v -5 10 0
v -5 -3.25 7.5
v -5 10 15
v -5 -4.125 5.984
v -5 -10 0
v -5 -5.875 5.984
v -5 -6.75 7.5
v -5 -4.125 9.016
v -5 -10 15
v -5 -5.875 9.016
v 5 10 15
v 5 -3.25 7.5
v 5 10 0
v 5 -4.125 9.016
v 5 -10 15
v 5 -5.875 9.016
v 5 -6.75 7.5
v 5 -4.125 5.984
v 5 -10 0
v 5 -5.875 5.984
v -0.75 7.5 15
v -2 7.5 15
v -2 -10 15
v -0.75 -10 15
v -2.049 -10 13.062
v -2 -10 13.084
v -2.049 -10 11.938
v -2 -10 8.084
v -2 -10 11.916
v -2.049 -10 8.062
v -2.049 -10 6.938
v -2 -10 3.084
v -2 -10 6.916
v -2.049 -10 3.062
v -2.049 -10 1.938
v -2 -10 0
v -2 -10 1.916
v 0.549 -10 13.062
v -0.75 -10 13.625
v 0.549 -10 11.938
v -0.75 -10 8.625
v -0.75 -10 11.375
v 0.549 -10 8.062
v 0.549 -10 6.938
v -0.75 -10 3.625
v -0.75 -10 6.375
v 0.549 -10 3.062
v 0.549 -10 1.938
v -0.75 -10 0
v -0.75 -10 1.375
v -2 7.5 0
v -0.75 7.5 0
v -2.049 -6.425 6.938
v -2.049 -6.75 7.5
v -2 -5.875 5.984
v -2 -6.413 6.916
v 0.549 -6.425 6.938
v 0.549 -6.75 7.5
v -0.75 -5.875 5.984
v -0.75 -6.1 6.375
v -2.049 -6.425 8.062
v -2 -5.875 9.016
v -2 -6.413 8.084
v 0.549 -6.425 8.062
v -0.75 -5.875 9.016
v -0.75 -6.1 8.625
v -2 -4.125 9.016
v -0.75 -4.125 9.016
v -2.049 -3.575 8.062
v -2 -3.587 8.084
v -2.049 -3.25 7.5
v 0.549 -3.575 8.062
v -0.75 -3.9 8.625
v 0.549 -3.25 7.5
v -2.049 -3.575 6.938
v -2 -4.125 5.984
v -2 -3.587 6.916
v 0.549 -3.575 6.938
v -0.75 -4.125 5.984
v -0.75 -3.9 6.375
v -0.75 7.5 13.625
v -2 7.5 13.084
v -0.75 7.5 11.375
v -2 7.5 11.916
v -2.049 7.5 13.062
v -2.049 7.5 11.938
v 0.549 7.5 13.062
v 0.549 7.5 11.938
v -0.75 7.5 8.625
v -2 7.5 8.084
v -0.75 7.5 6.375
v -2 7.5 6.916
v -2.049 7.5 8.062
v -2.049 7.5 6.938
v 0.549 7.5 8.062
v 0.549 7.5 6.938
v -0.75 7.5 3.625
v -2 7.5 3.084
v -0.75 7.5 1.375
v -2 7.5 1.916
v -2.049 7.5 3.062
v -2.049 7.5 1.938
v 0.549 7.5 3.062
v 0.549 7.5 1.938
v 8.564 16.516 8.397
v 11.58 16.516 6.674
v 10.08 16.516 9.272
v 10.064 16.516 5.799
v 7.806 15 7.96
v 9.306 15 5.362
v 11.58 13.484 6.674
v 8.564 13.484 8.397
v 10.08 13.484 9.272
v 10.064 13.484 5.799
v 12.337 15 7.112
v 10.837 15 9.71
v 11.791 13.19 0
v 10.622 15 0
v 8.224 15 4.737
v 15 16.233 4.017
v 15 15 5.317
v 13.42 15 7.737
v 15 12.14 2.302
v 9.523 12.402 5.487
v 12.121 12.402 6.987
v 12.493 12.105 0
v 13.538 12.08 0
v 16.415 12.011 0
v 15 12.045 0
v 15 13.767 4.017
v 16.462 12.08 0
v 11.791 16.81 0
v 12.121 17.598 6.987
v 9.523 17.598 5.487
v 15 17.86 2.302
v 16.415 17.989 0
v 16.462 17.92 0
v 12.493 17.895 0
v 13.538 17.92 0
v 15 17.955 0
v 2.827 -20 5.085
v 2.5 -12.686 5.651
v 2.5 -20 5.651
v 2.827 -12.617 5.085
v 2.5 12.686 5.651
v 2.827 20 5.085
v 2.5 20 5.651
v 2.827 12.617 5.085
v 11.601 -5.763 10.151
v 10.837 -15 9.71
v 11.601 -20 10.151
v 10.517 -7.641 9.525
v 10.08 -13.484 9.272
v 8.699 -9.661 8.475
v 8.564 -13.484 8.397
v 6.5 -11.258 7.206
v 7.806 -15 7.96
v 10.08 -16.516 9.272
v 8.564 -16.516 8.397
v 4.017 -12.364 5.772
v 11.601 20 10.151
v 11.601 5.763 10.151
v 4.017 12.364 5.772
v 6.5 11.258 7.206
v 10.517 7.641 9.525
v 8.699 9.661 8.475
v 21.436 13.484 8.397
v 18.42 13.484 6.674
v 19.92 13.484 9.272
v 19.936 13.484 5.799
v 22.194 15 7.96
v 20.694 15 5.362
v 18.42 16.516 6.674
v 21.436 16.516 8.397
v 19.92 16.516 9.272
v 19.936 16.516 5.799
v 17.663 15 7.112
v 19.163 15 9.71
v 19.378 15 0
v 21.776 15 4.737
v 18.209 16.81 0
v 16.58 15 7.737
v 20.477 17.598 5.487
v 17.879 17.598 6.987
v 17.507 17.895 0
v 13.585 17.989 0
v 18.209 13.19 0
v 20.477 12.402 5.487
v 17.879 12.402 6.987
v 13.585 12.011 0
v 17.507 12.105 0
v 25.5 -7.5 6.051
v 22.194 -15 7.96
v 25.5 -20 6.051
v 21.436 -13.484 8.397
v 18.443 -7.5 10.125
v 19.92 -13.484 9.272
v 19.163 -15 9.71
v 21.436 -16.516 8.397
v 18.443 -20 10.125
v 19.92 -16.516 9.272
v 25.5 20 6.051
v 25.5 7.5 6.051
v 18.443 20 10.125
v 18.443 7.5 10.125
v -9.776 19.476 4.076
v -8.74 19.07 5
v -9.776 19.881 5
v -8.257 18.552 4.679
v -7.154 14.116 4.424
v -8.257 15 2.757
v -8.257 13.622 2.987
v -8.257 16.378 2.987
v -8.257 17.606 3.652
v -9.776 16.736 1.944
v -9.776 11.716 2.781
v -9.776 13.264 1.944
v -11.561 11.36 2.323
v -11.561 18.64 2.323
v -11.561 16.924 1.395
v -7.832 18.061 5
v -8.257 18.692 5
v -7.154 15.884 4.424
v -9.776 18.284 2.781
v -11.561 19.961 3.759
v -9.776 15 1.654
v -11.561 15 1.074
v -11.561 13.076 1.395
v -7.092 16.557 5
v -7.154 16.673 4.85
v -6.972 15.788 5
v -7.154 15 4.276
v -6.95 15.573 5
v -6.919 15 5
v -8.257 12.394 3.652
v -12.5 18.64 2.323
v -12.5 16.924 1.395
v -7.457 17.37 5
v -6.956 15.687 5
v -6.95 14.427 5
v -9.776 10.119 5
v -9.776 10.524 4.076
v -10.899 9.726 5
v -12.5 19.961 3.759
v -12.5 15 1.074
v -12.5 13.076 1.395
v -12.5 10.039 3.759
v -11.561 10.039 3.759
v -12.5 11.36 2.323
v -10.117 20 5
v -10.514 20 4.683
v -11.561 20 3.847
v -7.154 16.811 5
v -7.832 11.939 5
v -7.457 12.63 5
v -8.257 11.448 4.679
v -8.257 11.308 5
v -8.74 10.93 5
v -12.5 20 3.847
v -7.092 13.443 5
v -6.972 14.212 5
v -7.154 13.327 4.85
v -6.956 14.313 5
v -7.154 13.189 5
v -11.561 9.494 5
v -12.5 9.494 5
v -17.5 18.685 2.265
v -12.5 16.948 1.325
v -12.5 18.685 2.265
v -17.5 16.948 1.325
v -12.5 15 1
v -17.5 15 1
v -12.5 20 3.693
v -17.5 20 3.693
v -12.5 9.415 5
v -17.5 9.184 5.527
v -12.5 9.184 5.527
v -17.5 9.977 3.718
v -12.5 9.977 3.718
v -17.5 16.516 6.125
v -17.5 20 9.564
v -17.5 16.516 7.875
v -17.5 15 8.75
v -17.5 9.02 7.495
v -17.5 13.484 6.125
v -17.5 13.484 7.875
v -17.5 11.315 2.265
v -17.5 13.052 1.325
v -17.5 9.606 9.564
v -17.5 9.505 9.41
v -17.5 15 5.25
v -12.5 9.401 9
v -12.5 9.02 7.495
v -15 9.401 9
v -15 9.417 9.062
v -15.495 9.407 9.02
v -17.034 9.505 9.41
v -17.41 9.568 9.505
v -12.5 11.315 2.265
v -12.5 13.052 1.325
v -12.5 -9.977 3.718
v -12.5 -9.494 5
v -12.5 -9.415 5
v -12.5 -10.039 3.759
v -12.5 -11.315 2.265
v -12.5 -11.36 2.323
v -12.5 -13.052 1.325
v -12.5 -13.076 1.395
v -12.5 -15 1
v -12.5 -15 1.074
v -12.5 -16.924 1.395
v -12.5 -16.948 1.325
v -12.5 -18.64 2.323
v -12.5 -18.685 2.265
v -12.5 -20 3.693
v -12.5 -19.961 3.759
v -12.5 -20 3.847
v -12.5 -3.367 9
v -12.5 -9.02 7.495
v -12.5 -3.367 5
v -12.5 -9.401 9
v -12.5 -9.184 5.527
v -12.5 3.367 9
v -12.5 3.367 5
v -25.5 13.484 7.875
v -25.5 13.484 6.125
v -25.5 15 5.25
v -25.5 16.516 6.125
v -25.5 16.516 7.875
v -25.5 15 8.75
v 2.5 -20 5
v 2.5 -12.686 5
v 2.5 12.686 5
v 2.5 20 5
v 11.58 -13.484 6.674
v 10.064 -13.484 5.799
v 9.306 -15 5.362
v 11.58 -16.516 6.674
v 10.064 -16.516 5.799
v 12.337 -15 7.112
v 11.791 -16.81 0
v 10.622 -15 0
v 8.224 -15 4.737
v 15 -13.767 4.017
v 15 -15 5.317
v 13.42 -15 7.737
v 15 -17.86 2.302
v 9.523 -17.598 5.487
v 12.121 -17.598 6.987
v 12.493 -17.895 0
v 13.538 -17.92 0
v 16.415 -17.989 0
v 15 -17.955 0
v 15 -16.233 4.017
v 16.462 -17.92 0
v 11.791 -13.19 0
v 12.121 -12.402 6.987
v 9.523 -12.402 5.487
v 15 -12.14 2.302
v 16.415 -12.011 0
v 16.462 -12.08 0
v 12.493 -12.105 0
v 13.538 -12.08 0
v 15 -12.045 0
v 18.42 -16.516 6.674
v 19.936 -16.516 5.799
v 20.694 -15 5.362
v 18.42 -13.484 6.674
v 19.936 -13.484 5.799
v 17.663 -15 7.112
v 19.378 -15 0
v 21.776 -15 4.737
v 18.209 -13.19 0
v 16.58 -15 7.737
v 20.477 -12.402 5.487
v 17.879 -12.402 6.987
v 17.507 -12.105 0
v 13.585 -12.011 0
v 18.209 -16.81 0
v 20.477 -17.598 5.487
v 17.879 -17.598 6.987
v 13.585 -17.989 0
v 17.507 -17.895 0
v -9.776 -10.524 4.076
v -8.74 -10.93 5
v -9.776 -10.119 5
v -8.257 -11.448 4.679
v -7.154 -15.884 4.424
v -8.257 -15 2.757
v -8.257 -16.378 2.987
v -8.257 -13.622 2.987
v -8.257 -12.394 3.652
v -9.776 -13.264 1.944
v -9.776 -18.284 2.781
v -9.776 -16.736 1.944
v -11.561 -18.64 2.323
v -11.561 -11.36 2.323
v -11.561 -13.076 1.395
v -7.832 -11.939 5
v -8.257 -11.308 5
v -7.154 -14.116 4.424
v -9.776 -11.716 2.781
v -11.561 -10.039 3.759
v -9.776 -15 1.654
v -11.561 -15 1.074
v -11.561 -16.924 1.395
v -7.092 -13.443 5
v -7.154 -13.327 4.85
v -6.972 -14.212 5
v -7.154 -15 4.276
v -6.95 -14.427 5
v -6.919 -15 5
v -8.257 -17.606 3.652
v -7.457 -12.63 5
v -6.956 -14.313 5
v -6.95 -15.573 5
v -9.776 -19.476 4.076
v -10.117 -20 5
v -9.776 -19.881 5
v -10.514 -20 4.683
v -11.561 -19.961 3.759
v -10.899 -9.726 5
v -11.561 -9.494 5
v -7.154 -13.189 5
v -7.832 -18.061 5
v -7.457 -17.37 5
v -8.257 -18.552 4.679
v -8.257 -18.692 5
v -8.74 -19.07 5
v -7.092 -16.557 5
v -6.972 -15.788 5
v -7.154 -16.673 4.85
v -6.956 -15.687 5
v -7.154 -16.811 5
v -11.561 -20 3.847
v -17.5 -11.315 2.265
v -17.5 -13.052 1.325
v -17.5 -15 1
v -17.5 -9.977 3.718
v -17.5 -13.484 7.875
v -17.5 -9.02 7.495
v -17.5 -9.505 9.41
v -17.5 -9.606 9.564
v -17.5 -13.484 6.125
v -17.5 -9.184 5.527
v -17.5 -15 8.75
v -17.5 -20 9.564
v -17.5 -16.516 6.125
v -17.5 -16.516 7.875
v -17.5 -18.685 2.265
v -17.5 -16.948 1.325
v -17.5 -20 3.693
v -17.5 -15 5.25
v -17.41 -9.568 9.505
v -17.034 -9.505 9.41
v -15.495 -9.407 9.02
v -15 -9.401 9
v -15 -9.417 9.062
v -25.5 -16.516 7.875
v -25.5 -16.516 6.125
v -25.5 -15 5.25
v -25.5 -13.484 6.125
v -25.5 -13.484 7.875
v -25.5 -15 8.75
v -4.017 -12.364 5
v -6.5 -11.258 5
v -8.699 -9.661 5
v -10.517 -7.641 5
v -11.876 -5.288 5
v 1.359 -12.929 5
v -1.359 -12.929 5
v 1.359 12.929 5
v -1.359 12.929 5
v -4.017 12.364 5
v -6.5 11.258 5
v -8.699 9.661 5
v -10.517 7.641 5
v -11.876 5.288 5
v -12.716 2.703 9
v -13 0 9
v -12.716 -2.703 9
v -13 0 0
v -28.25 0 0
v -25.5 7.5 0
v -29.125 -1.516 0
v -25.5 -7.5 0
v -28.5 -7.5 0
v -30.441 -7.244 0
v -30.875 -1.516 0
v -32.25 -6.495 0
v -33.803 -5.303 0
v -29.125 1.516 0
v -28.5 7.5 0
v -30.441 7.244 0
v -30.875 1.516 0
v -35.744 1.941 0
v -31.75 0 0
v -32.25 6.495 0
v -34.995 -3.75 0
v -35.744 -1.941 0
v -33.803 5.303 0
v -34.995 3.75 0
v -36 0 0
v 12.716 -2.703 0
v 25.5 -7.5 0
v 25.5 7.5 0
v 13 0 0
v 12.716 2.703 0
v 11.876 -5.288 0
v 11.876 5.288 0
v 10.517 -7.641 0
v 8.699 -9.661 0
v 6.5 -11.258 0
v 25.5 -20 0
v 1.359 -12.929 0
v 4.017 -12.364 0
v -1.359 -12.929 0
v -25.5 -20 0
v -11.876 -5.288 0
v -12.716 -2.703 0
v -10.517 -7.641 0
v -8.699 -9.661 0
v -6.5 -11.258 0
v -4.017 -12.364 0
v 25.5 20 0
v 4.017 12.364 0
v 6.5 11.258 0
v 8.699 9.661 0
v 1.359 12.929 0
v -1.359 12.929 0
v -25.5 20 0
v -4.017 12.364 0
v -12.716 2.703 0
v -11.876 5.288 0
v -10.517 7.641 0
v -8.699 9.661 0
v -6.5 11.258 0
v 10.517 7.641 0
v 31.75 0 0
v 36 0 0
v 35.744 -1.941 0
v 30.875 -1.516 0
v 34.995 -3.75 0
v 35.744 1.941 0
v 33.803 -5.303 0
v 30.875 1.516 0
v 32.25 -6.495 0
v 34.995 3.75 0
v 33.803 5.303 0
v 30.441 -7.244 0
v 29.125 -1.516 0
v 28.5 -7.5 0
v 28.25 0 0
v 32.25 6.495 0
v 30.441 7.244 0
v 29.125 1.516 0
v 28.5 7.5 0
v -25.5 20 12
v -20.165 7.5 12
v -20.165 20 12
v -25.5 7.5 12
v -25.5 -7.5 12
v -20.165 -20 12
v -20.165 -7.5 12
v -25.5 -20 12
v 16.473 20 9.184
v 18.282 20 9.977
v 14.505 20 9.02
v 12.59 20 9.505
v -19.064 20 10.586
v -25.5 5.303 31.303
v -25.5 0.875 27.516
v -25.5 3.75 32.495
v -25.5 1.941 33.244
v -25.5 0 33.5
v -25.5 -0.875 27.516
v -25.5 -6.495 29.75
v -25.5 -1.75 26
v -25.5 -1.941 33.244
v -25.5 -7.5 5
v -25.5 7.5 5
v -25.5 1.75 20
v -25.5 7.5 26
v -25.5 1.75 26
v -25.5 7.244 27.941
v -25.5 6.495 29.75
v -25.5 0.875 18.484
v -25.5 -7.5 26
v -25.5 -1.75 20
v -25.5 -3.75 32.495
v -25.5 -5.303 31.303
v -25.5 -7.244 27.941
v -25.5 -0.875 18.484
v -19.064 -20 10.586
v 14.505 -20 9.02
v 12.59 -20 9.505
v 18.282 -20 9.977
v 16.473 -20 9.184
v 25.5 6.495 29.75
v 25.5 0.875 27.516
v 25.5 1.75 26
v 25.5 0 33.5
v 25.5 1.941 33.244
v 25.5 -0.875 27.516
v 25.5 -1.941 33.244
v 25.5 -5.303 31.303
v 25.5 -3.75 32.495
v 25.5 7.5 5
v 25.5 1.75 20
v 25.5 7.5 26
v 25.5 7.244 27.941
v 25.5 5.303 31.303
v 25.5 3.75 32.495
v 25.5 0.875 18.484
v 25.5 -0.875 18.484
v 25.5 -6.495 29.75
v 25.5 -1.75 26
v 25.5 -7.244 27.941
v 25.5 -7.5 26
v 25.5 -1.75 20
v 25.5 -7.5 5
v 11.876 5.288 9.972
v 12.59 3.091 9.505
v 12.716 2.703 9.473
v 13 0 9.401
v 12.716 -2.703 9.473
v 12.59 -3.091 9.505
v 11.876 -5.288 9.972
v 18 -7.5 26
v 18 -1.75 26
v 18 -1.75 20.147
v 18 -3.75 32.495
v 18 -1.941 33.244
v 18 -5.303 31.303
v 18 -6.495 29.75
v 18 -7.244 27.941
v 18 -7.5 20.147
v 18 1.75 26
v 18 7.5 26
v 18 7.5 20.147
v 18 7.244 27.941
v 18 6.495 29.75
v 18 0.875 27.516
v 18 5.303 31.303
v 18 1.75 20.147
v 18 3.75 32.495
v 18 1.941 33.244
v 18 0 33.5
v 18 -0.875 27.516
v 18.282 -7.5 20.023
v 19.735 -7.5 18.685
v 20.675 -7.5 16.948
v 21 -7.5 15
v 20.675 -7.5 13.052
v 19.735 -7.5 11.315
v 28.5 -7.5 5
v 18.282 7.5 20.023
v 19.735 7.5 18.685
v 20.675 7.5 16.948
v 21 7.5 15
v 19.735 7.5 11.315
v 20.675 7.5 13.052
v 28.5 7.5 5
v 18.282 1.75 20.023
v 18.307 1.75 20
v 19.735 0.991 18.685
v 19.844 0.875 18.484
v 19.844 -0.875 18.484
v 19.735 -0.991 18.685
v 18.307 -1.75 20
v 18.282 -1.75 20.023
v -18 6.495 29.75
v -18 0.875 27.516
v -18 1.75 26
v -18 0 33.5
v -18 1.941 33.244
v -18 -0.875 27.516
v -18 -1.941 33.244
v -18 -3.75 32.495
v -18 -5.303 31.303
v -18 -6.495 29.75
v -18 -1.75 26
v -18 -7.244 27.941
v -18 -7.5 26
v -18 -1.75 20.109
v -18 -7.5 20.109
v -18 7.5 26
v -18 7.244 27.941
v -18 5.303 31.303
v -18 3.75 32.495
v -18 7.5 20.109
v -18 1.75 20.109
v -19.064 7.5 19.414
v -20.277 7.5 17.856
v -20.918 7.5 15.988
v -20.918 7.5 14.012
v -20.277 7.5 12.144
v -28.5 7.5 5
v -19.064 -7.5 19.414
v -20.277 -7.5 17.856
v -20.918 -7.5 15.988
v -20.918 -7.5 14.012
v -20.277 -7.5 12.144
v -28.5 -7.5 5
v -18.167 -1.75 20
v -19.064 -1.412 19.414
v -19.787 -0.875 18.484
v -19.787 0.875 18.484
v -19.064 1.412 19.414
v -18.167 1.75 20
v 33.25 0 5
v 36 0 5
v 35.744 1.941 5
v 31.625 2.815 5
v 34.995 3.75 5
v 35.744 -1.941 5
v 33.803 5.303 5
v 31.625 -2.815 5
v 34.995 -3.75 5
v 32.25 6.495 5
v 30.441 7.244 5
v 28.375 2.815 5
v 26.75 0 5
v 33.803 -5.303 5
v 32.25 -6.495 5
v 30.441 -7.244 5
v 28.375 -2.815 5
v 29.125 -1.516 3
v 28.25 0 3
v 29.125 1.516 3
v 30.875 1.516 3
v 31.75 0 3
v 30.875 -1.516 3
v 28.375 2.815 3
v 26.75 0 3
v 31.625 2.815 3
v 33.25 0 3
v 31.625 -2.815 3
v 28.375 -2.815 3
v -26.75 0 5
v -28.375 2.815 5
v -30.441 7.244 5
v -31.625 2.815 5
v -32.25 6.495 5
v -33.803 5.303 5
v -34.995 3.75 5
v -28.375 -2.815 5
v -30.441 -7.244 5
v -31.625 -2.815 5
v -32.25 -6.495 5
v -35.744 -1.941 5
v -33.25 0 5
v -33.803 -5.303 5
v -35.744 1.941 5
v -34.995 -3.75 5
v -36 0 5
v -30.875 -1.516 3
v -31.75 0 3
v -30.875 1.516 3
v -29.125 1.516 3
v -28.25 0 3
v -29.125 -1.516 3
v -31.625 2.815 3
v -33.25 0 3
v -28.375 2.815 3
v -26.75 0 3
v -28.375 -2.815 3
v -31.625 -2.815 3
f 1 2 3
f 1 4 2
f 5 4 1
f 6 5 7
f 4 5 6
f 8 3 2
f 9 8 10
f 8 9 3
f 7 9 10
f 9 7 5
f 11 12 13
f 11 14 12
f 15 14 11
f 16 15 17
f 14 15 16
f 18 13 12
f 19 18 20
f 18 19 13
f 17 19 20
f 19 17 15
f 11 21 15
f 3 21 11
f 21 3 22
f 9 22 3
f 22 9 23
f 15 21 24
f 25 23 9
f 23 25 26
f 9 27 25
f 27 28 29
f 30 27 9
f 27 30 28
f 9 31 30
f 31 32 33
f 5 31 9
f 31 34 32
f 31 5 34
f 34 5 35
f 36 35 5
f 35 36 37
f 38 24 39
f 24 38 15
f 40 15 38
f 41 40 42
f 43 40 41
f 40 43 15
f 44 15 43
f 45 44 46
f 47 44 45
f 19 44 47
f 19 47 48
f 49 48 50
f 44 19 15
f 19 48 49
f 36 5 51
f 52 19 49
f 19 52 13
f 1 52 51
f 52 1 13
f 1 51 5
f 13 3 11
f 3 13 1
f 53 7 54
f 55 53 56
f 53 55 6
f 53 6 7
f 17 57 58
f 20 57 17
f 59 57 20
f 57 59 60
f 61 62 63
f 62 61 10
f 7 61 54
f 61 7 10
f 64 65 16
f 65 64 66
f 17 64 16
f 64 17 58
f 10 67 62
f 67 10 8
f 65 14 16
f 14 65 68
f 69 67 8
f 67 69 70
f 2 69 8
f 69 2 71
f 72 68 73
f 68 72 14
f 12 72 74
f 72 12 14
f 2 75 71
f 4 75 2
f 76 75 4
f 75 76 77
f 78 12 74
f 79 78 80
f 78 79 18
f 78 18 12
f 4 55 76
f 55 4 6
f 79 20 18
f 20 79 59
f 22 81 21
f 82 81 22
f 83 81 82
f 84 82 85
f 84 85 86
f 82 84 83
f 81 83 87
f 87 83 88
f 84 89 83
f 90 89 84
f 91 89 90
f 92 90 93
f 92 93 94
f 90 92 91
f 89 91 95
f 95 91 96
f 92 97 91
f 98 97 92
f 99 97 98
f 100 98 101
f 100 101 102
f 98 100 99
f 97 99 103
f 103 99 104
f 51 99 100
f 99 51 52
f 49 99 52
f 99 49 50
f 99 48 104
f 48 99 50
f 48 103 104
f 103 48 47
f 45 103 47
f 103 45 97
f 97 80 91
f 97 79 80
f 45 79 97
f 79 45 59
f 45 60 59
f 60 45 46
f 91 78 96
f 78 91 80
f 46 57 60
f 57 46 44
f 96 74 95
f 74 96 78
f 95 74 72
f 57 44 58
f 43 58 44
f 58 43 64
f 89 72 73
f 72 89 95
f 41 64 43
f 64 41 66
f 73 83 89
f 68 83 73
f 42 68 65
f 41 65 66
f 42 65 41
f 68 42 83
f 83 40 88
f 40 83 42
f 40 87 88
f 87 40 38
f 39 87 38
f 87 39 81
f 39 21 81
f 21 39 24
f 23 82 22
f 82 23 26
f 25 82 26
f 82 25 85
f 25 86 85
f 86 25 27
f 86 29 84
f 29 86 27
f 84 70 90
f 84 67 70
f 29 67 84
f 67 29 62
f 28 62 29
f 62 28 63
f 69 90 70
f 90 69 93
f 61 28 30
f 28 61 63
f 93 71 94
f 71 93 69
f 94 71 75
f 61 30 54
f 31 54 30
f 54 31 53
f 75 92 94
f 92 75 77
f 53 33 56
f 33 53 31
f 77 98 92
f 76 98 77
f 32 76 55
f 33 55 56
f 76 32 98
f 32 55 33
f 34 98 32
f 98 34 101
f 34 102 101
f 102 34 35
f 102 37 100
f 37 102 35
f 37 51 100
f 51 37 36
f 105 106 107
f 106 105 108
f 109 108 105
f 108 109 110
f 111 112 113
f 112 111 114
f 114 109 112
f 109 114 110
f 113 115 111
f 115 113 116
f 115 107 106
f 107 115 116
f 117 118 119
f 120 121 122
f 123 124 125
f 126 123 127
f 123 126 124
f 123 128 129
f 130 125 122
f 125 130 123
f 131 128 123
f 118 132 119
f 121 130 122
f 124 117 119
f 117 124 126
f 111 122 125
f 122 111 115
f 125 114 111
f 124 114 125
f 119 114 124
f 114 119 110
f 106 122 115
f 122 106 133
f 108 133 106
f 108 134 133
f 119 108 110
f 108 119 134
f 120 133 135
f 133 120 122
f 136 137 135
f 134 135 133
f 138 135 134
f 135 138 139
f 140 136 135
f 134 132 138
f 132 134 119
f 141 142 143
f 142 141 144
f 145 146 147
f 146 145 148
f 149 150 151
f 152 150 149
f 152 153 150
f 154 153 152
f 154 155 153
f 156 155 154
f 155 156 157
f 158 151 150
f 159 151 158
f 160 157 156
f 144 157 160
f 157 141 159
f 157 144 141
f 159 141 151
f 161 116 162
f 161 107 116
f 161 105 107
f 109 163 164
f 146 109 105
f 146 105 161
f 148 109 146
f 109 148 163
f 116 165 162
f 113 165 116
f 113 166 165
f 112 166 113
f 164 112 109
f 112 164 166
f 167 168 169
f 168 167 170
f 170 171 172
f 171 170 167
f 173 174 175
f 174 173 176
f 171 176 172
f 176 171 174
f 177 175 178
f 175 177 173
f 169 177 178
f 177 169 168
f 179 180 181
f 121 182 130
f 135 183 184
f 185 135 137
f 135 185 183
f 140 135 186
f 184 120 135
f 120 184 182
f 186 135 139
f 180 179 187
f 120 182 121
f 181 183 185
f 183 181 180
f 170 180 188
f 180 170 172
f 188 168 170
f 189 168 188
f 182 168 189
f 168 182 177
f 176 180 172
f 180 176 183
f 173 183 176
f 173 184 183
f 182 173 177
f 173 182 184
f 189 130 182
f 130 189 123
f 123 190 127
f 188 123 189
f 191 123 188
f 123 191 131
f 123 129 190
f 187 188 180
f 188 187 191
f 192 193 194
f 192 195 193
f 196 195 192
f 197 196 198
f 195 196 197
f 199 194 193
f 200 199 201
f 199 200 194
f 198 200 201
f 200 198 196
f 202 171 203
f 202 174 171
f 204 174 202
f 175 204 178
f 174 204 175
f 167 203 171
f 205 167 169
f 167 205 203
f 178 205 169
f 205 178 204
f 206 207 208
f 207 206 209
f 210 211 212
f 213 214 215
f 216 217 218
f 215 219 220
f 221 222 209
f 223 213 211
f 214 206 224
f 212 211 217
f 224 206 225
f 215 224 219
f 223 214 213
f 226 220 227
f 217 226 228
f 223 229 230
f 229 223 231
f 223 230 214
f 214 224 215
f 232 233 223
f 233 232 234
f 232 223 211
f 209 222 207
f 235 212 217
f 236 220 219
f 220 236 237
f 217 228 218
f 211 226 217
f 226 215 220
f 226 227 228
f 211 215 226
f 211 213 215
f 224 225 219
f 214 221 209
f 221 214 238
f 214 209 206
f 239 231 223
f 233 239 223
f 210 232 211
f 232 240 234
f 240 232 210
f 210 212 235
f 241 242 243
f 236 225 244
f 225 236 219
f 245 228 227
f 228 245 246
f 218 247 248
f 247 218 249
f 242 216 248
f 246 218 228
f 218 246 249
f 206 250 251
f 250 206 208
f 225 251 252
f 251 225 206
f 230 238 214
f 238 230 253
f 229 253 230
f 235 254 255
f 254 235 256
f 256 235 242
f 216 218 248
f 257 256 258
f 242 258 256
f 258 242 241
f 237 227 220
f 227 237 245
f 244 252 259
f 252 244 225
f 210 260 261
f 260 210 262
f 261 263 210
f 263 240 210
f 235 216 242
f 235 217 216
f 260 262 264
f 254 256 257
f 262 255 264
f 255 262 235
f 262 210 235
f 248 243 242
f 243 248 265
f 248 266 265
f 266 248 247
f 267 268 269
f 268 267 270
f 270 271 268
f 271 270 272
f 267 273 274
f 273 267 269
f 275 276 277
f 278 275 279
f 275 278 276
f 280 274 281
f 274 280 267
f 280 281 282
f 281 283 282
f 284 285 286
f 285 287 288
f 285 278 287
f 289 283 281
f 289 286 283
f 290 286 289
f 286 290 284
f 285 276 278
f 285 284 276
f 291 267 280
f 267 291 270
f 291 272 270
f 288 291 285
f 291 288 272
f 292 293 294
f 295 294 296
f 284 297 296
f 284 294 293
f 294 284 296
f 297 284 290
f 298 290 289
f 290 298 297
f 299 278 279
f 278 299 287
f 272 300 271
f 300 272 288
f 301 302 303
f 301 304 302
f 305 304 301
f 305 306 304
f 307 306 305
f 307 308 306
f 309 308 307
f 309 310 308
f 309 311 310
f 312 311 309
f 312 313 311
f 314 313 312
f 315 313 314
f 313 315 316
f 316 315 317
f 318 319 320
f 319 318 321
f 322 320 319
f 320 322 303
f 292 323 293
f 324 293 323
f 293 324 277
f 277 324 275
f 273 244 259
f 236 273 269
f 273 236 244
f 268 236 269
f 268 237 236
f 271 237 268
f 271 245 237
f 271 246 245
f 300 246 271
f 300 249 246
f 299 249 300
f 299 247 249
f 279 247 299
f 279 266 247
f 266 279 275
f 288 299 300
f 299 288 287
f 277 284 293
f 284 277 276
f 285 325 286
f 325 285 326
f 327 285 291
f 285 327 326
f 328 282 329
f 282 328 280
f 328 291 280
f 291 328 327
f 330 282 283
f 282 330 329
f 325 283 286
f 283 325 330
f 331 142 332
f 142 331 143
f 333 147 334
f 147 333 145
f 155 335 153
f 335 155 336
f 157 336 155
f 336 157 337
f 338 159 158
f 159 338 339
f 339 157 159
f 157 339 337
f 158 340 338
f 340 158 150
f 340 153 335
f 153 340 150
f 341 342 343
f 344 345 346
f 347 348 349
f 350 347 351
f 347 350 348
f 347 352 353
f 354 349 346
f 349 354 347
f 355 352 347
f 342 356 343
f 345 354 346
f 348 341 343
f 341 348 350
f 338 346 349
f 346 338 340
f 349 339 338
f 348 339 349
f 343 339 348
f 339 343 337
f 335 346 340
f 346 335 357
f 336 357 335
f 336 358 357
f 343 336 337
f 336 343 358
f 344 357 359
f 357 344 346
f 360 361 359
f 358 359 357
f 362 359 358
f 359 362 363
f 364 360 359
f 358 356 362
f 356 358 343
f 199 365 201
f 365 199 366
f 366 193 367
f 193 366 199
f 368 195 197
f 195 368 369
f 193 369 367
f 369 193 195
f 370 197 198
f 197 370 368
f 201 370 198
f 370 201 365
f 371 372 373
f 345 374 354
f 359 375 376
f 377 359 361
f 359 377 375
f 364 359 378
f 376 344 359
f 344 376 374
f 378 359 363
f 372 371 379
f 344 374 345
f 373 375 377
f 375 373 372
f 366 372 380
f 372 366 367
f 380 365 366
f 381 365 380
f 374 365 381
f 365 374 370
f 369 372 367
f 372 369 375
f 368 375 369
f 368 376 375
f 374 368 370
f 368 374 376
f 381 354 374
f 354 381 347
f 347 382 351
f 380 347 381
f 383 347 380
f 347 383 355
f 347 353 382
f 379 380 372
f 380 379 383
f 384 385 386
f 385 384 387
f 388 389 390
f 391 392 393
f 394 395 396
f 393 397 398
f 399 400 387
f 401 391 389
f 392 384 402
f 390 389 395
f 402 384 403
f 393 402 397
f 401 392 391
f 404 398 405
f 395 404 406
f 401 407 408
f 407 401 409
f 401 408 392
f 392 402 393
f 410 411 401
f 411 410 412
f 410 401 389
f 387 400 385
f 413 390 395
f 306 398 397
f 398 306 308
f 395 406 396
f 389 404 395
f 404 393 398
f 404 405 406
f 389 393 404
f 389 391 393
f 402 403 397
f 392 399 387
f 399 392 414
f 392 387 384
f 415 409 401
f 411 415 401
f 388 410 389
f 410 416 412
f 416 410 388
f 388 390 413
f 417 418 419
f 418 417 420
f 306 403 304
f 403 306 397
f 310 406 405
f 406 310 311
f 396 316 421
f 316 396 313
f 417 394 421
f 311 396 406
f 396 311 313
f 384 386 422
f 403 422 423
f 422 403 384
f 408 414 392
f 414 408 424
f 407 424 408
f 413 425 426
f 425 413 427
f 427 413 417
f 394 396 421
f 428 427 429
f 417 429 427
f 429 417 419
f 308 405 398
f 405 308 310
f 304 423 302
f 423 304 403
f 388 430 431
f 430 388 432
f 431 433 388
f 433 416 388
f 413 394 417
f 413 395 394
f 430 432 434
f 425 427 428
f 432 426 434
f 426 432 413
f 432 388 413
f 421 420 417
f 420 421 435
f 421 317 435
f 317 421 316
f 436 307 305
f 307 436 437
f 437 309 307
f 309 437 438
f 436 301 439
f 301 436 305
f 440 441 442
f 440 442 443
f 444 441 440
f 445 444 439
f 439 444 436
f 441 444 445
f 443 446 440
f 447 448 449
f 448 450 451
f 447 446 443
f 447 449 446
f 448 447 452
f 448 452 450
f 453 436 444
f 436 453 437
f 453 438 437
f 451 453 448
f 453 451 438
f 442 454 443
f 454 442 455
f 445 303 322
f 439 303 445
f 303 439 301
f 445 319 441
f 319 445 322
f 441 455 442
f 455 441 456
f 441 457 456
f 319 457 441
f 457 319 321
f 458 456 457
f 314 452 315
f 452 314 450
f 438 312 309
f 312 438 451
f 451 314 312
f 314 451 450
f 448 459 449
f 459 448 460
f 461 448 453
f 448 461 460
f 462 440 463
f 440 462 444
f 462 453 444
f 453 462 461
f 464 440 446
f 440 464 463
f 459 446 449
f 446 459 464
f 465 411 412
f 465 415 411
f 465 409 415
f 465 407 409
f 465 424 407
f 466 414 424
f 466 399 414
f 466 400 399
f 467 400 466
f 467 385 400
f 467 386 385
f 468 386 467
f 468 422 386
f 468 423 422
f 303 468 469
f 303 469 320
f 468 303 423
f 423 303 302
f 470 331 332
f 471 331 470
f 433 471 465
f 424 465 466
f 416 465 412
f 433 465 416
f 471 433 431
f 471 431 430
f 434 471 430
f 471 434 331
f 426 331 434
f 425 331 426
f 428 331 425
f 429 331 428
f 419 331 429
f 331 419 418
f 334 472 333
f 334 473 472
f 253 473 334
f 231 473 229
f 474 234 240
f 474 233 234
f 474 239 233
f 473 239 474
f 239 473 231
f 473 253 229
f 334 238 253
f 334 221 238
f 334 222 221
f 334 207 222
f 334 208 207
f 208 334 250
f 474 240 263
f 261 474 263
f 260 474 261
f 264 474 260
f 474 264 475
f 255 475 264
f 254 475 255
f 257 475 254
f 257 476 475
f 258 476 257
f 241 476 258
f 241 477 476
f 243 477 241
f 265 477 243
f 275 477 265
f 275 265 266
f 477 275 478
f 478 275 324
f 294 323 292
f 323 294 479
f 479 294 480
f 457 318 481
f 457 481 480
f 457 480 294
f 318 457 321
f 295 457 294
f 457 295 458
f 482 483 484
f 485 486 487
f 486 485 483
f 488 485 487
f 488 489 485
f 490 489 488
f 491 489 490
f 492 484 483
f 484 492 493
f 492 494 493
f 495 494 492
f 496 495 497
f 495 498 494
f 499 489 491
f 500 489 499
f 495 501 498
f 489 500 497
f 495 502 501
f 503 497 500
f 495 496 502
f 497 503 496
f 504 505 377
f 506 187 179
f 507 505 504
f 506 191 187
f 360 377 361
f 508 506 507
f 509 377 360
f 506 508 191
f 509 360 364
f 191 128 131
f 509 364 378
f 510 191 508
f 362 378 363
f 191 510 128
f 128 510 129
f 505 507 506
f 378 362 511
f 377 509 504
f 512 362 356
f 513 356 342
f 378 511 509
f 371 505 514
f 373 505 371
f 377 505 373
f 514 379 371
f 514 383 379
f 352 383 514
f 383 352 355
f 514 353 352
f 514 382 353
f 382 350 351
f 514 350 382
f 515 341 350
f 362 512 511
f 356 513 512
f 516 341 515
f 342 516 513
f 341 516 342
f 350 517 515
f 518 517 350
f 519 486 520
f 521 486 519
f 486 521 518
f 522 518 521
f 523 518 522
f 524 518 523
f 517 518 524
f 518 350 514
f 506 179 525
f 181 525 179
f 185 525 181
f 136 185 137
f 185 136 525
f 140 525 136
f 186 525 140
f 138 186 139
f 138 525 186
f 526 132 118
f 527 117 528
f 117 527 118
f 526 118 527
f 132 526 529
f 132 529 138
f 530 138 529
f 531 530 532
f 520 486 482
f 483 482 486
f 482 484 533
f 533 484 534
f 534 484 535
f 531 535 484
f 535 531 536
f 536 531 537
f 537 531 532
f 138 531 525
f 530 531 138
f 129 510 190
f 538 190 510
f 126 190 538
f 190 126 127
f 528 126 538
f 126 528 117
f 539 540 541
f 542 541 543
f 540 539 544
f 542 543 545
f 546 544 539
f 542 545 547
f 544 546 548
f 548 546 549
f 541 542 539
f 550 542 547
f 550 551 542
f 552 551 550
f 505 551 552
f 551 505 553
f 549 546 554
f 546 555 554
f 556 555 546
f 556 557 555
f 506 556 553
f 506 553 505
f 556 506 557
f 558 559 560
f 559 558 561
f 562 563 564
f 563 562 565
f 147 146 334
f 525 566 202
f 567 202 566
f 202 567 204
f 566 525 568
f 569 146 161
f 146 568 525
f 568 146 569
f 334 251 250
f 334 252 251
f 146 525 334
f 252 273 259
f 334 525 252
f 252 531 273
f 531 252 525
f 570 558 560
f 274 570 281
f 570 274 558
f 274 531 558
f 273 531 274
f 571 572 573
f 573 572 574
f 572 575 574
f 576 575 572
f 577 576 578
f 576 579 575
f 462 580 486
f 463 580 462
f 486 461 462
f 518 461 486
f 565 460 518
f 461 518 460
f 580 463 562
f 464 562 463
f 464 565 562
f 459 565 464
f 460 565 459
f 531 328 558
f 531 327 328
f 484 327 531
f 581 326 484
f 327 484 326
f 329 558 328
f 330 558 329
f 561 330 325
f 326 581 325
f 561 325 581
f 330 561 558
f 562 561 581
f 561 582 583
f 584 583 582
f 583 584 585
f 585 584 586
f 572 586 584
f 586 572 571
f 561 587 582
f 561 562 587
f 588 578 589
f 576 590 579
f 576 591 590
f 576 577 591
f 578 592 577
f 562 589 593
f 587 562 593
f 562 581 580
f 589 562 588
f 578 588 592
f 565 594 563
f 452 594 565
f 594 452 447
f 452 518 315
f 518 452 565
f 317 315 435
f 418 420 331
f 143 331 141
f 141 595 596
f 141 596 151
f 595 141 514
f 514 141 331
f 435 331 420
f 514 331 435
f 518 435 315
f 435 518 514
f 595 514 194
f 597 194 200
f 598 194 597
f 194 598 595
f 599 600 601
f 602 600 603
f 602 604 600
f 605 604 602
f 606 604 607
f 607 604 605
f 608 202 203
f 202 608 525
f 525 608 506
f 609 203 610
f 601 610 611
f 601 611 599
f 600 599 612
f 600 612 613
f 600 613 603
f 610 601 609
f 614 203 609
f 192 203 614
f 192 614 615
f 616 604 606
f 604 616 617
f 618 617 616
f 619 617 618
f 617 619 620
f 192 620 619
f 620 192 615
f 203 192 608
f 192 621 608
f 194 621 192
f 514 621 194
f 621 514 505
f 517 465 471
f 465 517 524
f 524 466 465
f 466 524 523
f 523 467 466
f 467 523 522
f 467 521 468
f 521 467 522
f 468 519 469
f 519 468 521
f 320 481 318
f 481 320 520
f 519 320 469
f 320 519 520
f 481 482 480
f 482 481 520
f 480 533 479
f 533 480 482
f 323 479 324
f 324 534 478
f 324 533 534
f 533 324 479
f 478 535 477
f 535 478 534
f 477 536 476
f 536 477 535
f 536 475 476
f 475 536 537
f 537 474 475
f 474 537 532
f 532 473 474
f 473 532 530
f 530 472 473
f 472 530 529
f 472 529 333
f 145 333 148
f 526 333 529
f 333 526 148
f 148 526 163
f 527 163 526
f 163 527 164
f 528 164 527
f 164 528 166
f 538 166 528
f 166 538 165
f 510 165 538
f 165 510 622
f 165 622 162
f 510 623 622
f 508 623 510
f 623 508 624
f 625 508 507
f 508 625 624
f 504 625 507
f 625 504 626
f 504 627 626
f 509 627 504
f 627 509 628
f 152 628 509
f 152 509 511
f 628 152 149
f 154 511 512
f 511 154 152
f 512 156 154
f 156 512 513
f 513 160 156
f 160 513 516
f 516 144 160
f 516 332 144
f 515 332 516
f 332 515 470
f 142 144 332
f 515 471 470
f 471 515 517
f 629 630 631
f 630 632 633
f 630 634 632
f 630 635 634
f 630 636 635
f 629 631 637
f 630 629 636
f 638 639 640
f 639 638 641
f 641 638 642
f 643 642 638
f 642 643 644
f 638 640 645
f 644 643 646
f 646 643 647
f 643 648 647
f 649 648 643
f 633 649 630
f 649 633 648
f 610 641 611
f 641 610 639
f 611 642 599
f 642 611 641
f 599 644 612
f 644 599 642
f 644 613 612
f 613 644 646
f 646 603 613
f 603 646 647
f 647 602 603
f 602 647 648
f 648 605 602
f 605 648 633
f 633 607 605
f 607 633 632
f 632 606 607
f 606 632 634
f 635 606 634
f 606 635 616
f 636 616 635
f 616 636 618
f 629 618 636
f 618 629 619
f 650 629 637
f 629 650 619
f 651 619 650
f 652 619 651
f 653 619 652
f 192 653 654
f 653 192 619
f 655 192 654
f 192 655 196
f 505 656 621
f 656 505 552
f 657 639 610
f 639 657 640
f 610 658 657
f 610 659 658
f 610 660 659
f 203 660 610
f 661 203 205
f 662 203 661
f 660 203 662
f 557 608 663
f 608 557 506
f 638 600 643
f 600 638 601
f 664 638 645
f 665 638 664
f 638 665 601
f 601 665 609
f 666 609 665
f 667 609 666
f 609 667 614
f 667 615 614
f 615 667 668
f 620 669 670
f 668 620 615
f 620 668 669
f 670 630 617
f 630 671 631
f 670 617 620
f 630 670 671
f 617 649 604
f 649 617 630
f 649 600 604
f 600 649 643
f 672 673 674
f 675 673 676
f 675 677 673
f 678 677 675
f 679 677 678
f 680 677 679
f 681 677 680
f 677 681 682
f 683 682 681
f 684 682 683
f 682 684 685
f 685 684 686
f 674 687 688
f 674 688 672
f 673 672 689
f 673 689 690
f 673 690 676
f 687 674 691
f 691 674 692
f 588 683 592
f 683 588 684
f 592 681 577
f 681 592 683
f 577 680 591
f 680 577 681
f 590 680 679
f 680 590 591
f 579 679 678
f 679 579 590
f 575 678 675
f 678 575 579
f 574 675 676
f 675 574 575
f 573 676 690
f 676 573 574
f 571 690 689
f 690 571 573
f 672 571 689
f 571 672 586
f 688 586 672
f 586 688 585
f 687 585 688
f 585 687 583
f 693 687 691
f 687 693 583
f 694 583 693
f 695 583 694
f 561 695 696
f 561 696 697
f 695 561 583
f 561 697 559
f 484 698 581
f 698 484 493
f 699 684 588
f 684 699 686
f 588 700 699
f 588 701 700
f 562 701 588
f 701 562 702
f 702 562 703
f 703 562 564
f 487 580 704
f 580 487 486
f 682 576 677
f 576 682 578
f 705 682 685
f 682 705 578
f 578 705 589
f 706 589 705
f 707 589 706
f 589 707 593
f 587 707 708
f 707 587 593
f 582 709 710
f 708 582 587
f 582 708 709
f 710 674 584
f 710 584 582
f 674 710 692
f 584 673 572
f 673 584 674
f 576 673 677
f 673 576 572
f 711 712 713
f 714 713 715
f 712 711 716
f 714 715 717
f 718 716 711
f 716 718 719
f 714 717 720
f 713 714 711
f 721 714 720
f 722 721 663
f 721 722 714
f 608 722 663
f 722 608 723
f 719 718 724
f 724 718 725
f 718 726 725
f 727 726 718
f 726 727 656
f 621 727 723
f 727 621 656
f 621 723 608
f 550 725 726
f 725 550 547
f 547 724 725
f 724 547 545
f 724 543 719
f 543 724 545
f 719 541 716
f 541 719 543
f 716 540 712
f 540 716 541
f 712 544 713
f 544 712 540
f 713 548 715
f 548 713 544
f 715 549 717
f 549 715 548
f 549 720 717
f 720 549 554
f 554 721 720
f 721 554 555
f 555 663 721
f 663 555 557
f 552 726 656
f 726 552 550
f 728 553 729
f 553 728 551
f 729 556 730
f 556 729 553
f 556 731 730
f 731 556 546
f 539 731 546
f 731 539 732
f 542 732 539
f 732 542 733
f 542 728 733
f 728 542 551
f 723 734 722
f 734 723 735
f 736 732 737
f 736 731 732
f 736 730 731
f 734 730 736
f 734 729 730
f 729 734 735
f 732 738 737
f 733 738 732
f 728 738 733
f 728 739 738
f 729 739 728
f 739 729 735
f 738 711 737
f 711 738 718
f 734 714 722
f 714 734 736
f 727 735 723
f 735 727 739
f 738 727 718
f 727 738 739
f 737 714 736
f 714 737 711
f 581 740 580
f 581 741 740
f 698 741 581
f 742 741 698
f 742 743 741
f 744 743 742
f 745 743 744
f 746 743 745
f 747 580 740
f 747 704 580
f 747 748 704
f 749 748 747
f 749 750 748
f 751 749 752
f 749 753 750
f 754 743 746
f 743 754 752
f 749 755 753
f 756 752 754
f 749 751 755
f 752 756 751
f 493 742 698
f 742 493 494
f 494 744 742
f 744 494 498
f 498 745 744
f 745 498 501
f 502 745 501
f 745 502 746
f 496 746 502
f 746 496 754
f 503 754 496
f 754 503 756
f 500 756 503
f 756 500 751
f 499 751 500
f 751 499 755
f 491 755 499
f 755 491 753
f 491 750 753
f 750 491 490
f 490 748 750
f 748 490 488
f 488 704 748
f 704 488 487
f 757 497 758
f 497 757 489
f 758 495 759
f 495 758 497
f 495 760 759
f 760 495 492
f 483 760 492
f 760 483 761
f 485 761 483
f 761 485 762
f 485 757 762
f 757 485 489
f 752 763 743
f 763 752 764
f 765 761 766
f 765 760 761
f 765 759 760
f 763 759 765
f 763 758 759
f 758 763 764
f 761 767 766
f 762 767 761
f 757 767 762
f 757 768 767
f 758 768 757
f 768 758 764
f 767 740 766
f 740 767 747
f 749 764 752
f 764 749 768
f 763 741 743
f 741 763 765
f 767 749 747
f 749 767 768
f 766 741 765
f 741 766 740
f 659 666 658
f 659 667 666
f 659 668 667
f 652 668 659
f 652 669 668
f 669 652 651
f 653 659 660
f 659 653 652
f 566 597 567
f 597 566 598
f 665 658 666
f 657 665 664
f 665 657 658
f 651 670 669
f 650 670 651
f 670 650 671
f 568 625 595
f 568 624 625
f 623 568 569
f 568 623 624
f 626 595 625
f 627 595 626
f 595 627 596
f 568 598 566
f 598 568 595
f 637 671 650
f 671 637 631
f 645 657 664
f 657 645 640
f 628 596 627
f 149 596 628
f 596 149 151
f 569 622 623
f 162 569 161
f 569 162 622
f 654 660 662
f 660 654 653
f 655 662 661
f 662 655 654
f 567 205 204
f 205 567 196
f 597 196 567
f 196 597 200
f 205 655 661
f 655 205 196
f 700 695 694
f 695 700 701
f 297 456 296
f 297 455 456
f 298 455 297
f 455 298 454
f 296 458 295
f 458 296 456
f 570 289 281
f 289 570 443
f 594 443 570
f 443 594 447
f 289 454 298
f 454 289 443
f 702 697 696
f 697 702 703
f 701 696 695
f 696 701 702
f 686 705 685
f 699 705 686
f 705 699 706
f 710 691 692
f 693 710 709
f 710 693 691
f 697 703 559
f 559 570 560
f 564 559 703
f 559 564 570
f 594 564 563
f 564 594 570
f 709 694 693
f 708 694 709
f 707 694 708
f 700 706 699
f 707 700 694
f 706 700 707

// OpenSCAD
//%translate([0, -20, 0]) import_stl("x-carriage-upper_1off.stl", convexity = 5);
translate([0, 30, 0]) translate([-0.1, -50, -3]) rotate([0, 0, -90]) import_stl("x-blunt-plate_1off.stl", convexity = 5);
translate([0, 50, 24]) rotate([0, 180,  -45]) import_stl("x-motor-end-clamp_1off.stl", convexity = 5);
//rotate([0, 0, 90]) import_stl("x-axis-sandwich-clamp_1off.stl", convexity = 5);
//%rotate([0, 180, 0]) import_stl("extruder-bracket-bowden_1off.stl", convexity = 5);


carriagewidth = 40;
rodsize = 6;
rodheight = 15;
rodspacing = 30;
screwsize = 3;
washersize = 0.5;
bearingsize = 10;
bearingwidth = 4;


module bearingneg(round = false, captivenut = true) translate([5 + rodsize / 2, 0, -bearingwidth / 2 - washersize]) union() {
	cylinder(r = (screwsize + 0.5) / 2, h = 40, center = true);
	if (captivenut) {
		translate([0, 0, -8]) cylinder(r1 = screwsize + 0.55, r2 = screwsize, h = 10, center = true, $fn = 6);
		*translate([0, 0, -18]) cylinder(r = screwsize + 0.25, h = 20.01, center = true, $fn = 6);
		}
	if (round) {
		translate([0, 0, 2.5]) cylinder(r = bearingsize / 2 + 1, h = 5, center = true);
		difference() {
			translate([0, 0, 5]) sphere(r = bearingsize / 2 + 1, center = true);
			translate([0, 0, 3 - bearingsize / 2]) cube(bearingsize + 2, center = true); 
		}
	}
	else translate([0, 0, 5]) cube([bearingsize + 5, carriagewidth, 10], center = true);
}


%for (side = [1, -1]) translate([side * rodspacing / 2, 0, rodheight]) rotate([90, 0, 0]) cylinder(r = rodsize / 2, h = 100, center = true);

module belt() union() {
	translate([1.25 / 2, 0, 0]) square([1.25, 30], center = true);
	for(i = [-3:3]) translate([1.25, 5 * i, 0]) rotate([0, 0, 90]) scale([0.75, 1, 1]) circle(r = 1.5,center = true, $fn = 6);
}

for (side = [0, 1]) rotate([0, 0, side * 180]) %translate([57 / 2, 0, rodheight]) linear_extrude(height = 5, center = true, convexity = 5) belt();




!difference() {union() {
	//translate([(rodspacing + bearingwidth + washersize * 4 + rodheight) / 2, 0, rodheight - 5]) 
	translate([-5, 10, 7.5]) rotate([90, 0, 0])
		difference() {
			translate([0, 0, 10]) rotate([0, 90, 0]) linear_extrude(height = 10, convexity = 5) difference() {
				square([20, 15], center = true);
				translate([-5, 0, 0]) circle(r = (screwsize + 0.5) / 2, center = true);
			}
			translate([3, 0, 2.5]) linear_extrude(height = 20, convexity = 5) belt();
		}
	
	
	difference() {
		union() {
			difference() {
				linear_extrude(height = rodheight - rodsize / 2, center = false, convexity = 5) difference() {
					square([rodspacing + bearingwidth + washersize * 4 + 15, carriagewidth], center = true);
					square([rodspacing - 15, carriagewidth - 20], center = true);
					circle(r = 13, center = true);
					//for(side = [1, -1]) translate([0, side * (carriagewidth / 2 - 5), 0]) circle(r = (screwsize + 0.5) / 2, center = true);
				}
				for (side = [1, -1]) {
					translate([rodspacing / 2, side * (carriagewidth / 2 - 5), rodheight]) rotate([0, 30, 180]) bearingneg();
					translate([rodspacing / 2, side * (carriagewidth / 2 - 5), rodheight]) rotate([0, 30, 0]) bearingneg();
				
					translate([-rodspacing / 2, side * (carriagewidth / 2 - 5), rodheight]) rotate([0, 90, 0]) bearingneg(true, false);
					translate([-5, 0, 15]) cube([15, carriagewidth + 0.1, 20], center = true);
					translate([-rodspacing / 2 + 5, 0, rodheight]) cube([10, carriagewidth + 0.1, rodsize * 2], center = true);
				}
			}
			for (side = [1, -1]) {
				translate([side * (rodspacing / 2 + bearingwidth / 2 + washersize * 2), 0, 0]) rotate([90, 0, side * 90]) linear_extrude(height = 7.5, center = false, convexity = 5) difference() {
					union() {
						translate([0, (rodheight + rodsize + 5) / 2, 0]) square([15, rodheight + rodsize + 5], center = true);
						translate([0, rodheight + rodsize + 5, 0]) circle(r = 7.5, center = true);
					}
					translate([0, rodheight + rodsize / 2 + 5, 0]) square([screwsize + 0.5, rodsize], center = true);
					translate([0, rodheight + 5, 0]) circle(r = (screwsize + 0.5) / 2, center = true);
					translate([0, rodheight + rodsize + 5, 0]) circle(r = (screwsize + 0.5) / 2, center = true);
				}
			}
			for (side = [1, -1]) difference() {
				linear_extrude(height = 5, convexity = 5) difference() {
					union() {
						translate([side * ((72 - 15 - rodspacing) / 4 + rodspacing / 2), 0, 0]) square([(72 - 15 - rodspacing) / 2, 15], center = true);
						translate([side * (72 / 2 - 7.5), 0, 0]) circle(r = 7.5, center = true);
					}
					translate([side * 30, 0, 0]) circle(r = (screwsize + 0.5) / 2, center = true);
				}
				translate([side * 30, 0, 3]) linear_extrude(height = 10, convexity = 5) circle(r = screwsize + 0.25, center = true, $fn = 6);
			}
		}
		for (side = [1, -1]) translate([side * rodspacing / 2, 0, rodheight]) rotate([90, 0, 0]) cylinder(r = rodsize * 1, h = 100, center = true);
	}
}
//translate([0, 0, 8.1]) linear_extrude(height = 30, convexity = 5) square([200, 200], center = true);
}
